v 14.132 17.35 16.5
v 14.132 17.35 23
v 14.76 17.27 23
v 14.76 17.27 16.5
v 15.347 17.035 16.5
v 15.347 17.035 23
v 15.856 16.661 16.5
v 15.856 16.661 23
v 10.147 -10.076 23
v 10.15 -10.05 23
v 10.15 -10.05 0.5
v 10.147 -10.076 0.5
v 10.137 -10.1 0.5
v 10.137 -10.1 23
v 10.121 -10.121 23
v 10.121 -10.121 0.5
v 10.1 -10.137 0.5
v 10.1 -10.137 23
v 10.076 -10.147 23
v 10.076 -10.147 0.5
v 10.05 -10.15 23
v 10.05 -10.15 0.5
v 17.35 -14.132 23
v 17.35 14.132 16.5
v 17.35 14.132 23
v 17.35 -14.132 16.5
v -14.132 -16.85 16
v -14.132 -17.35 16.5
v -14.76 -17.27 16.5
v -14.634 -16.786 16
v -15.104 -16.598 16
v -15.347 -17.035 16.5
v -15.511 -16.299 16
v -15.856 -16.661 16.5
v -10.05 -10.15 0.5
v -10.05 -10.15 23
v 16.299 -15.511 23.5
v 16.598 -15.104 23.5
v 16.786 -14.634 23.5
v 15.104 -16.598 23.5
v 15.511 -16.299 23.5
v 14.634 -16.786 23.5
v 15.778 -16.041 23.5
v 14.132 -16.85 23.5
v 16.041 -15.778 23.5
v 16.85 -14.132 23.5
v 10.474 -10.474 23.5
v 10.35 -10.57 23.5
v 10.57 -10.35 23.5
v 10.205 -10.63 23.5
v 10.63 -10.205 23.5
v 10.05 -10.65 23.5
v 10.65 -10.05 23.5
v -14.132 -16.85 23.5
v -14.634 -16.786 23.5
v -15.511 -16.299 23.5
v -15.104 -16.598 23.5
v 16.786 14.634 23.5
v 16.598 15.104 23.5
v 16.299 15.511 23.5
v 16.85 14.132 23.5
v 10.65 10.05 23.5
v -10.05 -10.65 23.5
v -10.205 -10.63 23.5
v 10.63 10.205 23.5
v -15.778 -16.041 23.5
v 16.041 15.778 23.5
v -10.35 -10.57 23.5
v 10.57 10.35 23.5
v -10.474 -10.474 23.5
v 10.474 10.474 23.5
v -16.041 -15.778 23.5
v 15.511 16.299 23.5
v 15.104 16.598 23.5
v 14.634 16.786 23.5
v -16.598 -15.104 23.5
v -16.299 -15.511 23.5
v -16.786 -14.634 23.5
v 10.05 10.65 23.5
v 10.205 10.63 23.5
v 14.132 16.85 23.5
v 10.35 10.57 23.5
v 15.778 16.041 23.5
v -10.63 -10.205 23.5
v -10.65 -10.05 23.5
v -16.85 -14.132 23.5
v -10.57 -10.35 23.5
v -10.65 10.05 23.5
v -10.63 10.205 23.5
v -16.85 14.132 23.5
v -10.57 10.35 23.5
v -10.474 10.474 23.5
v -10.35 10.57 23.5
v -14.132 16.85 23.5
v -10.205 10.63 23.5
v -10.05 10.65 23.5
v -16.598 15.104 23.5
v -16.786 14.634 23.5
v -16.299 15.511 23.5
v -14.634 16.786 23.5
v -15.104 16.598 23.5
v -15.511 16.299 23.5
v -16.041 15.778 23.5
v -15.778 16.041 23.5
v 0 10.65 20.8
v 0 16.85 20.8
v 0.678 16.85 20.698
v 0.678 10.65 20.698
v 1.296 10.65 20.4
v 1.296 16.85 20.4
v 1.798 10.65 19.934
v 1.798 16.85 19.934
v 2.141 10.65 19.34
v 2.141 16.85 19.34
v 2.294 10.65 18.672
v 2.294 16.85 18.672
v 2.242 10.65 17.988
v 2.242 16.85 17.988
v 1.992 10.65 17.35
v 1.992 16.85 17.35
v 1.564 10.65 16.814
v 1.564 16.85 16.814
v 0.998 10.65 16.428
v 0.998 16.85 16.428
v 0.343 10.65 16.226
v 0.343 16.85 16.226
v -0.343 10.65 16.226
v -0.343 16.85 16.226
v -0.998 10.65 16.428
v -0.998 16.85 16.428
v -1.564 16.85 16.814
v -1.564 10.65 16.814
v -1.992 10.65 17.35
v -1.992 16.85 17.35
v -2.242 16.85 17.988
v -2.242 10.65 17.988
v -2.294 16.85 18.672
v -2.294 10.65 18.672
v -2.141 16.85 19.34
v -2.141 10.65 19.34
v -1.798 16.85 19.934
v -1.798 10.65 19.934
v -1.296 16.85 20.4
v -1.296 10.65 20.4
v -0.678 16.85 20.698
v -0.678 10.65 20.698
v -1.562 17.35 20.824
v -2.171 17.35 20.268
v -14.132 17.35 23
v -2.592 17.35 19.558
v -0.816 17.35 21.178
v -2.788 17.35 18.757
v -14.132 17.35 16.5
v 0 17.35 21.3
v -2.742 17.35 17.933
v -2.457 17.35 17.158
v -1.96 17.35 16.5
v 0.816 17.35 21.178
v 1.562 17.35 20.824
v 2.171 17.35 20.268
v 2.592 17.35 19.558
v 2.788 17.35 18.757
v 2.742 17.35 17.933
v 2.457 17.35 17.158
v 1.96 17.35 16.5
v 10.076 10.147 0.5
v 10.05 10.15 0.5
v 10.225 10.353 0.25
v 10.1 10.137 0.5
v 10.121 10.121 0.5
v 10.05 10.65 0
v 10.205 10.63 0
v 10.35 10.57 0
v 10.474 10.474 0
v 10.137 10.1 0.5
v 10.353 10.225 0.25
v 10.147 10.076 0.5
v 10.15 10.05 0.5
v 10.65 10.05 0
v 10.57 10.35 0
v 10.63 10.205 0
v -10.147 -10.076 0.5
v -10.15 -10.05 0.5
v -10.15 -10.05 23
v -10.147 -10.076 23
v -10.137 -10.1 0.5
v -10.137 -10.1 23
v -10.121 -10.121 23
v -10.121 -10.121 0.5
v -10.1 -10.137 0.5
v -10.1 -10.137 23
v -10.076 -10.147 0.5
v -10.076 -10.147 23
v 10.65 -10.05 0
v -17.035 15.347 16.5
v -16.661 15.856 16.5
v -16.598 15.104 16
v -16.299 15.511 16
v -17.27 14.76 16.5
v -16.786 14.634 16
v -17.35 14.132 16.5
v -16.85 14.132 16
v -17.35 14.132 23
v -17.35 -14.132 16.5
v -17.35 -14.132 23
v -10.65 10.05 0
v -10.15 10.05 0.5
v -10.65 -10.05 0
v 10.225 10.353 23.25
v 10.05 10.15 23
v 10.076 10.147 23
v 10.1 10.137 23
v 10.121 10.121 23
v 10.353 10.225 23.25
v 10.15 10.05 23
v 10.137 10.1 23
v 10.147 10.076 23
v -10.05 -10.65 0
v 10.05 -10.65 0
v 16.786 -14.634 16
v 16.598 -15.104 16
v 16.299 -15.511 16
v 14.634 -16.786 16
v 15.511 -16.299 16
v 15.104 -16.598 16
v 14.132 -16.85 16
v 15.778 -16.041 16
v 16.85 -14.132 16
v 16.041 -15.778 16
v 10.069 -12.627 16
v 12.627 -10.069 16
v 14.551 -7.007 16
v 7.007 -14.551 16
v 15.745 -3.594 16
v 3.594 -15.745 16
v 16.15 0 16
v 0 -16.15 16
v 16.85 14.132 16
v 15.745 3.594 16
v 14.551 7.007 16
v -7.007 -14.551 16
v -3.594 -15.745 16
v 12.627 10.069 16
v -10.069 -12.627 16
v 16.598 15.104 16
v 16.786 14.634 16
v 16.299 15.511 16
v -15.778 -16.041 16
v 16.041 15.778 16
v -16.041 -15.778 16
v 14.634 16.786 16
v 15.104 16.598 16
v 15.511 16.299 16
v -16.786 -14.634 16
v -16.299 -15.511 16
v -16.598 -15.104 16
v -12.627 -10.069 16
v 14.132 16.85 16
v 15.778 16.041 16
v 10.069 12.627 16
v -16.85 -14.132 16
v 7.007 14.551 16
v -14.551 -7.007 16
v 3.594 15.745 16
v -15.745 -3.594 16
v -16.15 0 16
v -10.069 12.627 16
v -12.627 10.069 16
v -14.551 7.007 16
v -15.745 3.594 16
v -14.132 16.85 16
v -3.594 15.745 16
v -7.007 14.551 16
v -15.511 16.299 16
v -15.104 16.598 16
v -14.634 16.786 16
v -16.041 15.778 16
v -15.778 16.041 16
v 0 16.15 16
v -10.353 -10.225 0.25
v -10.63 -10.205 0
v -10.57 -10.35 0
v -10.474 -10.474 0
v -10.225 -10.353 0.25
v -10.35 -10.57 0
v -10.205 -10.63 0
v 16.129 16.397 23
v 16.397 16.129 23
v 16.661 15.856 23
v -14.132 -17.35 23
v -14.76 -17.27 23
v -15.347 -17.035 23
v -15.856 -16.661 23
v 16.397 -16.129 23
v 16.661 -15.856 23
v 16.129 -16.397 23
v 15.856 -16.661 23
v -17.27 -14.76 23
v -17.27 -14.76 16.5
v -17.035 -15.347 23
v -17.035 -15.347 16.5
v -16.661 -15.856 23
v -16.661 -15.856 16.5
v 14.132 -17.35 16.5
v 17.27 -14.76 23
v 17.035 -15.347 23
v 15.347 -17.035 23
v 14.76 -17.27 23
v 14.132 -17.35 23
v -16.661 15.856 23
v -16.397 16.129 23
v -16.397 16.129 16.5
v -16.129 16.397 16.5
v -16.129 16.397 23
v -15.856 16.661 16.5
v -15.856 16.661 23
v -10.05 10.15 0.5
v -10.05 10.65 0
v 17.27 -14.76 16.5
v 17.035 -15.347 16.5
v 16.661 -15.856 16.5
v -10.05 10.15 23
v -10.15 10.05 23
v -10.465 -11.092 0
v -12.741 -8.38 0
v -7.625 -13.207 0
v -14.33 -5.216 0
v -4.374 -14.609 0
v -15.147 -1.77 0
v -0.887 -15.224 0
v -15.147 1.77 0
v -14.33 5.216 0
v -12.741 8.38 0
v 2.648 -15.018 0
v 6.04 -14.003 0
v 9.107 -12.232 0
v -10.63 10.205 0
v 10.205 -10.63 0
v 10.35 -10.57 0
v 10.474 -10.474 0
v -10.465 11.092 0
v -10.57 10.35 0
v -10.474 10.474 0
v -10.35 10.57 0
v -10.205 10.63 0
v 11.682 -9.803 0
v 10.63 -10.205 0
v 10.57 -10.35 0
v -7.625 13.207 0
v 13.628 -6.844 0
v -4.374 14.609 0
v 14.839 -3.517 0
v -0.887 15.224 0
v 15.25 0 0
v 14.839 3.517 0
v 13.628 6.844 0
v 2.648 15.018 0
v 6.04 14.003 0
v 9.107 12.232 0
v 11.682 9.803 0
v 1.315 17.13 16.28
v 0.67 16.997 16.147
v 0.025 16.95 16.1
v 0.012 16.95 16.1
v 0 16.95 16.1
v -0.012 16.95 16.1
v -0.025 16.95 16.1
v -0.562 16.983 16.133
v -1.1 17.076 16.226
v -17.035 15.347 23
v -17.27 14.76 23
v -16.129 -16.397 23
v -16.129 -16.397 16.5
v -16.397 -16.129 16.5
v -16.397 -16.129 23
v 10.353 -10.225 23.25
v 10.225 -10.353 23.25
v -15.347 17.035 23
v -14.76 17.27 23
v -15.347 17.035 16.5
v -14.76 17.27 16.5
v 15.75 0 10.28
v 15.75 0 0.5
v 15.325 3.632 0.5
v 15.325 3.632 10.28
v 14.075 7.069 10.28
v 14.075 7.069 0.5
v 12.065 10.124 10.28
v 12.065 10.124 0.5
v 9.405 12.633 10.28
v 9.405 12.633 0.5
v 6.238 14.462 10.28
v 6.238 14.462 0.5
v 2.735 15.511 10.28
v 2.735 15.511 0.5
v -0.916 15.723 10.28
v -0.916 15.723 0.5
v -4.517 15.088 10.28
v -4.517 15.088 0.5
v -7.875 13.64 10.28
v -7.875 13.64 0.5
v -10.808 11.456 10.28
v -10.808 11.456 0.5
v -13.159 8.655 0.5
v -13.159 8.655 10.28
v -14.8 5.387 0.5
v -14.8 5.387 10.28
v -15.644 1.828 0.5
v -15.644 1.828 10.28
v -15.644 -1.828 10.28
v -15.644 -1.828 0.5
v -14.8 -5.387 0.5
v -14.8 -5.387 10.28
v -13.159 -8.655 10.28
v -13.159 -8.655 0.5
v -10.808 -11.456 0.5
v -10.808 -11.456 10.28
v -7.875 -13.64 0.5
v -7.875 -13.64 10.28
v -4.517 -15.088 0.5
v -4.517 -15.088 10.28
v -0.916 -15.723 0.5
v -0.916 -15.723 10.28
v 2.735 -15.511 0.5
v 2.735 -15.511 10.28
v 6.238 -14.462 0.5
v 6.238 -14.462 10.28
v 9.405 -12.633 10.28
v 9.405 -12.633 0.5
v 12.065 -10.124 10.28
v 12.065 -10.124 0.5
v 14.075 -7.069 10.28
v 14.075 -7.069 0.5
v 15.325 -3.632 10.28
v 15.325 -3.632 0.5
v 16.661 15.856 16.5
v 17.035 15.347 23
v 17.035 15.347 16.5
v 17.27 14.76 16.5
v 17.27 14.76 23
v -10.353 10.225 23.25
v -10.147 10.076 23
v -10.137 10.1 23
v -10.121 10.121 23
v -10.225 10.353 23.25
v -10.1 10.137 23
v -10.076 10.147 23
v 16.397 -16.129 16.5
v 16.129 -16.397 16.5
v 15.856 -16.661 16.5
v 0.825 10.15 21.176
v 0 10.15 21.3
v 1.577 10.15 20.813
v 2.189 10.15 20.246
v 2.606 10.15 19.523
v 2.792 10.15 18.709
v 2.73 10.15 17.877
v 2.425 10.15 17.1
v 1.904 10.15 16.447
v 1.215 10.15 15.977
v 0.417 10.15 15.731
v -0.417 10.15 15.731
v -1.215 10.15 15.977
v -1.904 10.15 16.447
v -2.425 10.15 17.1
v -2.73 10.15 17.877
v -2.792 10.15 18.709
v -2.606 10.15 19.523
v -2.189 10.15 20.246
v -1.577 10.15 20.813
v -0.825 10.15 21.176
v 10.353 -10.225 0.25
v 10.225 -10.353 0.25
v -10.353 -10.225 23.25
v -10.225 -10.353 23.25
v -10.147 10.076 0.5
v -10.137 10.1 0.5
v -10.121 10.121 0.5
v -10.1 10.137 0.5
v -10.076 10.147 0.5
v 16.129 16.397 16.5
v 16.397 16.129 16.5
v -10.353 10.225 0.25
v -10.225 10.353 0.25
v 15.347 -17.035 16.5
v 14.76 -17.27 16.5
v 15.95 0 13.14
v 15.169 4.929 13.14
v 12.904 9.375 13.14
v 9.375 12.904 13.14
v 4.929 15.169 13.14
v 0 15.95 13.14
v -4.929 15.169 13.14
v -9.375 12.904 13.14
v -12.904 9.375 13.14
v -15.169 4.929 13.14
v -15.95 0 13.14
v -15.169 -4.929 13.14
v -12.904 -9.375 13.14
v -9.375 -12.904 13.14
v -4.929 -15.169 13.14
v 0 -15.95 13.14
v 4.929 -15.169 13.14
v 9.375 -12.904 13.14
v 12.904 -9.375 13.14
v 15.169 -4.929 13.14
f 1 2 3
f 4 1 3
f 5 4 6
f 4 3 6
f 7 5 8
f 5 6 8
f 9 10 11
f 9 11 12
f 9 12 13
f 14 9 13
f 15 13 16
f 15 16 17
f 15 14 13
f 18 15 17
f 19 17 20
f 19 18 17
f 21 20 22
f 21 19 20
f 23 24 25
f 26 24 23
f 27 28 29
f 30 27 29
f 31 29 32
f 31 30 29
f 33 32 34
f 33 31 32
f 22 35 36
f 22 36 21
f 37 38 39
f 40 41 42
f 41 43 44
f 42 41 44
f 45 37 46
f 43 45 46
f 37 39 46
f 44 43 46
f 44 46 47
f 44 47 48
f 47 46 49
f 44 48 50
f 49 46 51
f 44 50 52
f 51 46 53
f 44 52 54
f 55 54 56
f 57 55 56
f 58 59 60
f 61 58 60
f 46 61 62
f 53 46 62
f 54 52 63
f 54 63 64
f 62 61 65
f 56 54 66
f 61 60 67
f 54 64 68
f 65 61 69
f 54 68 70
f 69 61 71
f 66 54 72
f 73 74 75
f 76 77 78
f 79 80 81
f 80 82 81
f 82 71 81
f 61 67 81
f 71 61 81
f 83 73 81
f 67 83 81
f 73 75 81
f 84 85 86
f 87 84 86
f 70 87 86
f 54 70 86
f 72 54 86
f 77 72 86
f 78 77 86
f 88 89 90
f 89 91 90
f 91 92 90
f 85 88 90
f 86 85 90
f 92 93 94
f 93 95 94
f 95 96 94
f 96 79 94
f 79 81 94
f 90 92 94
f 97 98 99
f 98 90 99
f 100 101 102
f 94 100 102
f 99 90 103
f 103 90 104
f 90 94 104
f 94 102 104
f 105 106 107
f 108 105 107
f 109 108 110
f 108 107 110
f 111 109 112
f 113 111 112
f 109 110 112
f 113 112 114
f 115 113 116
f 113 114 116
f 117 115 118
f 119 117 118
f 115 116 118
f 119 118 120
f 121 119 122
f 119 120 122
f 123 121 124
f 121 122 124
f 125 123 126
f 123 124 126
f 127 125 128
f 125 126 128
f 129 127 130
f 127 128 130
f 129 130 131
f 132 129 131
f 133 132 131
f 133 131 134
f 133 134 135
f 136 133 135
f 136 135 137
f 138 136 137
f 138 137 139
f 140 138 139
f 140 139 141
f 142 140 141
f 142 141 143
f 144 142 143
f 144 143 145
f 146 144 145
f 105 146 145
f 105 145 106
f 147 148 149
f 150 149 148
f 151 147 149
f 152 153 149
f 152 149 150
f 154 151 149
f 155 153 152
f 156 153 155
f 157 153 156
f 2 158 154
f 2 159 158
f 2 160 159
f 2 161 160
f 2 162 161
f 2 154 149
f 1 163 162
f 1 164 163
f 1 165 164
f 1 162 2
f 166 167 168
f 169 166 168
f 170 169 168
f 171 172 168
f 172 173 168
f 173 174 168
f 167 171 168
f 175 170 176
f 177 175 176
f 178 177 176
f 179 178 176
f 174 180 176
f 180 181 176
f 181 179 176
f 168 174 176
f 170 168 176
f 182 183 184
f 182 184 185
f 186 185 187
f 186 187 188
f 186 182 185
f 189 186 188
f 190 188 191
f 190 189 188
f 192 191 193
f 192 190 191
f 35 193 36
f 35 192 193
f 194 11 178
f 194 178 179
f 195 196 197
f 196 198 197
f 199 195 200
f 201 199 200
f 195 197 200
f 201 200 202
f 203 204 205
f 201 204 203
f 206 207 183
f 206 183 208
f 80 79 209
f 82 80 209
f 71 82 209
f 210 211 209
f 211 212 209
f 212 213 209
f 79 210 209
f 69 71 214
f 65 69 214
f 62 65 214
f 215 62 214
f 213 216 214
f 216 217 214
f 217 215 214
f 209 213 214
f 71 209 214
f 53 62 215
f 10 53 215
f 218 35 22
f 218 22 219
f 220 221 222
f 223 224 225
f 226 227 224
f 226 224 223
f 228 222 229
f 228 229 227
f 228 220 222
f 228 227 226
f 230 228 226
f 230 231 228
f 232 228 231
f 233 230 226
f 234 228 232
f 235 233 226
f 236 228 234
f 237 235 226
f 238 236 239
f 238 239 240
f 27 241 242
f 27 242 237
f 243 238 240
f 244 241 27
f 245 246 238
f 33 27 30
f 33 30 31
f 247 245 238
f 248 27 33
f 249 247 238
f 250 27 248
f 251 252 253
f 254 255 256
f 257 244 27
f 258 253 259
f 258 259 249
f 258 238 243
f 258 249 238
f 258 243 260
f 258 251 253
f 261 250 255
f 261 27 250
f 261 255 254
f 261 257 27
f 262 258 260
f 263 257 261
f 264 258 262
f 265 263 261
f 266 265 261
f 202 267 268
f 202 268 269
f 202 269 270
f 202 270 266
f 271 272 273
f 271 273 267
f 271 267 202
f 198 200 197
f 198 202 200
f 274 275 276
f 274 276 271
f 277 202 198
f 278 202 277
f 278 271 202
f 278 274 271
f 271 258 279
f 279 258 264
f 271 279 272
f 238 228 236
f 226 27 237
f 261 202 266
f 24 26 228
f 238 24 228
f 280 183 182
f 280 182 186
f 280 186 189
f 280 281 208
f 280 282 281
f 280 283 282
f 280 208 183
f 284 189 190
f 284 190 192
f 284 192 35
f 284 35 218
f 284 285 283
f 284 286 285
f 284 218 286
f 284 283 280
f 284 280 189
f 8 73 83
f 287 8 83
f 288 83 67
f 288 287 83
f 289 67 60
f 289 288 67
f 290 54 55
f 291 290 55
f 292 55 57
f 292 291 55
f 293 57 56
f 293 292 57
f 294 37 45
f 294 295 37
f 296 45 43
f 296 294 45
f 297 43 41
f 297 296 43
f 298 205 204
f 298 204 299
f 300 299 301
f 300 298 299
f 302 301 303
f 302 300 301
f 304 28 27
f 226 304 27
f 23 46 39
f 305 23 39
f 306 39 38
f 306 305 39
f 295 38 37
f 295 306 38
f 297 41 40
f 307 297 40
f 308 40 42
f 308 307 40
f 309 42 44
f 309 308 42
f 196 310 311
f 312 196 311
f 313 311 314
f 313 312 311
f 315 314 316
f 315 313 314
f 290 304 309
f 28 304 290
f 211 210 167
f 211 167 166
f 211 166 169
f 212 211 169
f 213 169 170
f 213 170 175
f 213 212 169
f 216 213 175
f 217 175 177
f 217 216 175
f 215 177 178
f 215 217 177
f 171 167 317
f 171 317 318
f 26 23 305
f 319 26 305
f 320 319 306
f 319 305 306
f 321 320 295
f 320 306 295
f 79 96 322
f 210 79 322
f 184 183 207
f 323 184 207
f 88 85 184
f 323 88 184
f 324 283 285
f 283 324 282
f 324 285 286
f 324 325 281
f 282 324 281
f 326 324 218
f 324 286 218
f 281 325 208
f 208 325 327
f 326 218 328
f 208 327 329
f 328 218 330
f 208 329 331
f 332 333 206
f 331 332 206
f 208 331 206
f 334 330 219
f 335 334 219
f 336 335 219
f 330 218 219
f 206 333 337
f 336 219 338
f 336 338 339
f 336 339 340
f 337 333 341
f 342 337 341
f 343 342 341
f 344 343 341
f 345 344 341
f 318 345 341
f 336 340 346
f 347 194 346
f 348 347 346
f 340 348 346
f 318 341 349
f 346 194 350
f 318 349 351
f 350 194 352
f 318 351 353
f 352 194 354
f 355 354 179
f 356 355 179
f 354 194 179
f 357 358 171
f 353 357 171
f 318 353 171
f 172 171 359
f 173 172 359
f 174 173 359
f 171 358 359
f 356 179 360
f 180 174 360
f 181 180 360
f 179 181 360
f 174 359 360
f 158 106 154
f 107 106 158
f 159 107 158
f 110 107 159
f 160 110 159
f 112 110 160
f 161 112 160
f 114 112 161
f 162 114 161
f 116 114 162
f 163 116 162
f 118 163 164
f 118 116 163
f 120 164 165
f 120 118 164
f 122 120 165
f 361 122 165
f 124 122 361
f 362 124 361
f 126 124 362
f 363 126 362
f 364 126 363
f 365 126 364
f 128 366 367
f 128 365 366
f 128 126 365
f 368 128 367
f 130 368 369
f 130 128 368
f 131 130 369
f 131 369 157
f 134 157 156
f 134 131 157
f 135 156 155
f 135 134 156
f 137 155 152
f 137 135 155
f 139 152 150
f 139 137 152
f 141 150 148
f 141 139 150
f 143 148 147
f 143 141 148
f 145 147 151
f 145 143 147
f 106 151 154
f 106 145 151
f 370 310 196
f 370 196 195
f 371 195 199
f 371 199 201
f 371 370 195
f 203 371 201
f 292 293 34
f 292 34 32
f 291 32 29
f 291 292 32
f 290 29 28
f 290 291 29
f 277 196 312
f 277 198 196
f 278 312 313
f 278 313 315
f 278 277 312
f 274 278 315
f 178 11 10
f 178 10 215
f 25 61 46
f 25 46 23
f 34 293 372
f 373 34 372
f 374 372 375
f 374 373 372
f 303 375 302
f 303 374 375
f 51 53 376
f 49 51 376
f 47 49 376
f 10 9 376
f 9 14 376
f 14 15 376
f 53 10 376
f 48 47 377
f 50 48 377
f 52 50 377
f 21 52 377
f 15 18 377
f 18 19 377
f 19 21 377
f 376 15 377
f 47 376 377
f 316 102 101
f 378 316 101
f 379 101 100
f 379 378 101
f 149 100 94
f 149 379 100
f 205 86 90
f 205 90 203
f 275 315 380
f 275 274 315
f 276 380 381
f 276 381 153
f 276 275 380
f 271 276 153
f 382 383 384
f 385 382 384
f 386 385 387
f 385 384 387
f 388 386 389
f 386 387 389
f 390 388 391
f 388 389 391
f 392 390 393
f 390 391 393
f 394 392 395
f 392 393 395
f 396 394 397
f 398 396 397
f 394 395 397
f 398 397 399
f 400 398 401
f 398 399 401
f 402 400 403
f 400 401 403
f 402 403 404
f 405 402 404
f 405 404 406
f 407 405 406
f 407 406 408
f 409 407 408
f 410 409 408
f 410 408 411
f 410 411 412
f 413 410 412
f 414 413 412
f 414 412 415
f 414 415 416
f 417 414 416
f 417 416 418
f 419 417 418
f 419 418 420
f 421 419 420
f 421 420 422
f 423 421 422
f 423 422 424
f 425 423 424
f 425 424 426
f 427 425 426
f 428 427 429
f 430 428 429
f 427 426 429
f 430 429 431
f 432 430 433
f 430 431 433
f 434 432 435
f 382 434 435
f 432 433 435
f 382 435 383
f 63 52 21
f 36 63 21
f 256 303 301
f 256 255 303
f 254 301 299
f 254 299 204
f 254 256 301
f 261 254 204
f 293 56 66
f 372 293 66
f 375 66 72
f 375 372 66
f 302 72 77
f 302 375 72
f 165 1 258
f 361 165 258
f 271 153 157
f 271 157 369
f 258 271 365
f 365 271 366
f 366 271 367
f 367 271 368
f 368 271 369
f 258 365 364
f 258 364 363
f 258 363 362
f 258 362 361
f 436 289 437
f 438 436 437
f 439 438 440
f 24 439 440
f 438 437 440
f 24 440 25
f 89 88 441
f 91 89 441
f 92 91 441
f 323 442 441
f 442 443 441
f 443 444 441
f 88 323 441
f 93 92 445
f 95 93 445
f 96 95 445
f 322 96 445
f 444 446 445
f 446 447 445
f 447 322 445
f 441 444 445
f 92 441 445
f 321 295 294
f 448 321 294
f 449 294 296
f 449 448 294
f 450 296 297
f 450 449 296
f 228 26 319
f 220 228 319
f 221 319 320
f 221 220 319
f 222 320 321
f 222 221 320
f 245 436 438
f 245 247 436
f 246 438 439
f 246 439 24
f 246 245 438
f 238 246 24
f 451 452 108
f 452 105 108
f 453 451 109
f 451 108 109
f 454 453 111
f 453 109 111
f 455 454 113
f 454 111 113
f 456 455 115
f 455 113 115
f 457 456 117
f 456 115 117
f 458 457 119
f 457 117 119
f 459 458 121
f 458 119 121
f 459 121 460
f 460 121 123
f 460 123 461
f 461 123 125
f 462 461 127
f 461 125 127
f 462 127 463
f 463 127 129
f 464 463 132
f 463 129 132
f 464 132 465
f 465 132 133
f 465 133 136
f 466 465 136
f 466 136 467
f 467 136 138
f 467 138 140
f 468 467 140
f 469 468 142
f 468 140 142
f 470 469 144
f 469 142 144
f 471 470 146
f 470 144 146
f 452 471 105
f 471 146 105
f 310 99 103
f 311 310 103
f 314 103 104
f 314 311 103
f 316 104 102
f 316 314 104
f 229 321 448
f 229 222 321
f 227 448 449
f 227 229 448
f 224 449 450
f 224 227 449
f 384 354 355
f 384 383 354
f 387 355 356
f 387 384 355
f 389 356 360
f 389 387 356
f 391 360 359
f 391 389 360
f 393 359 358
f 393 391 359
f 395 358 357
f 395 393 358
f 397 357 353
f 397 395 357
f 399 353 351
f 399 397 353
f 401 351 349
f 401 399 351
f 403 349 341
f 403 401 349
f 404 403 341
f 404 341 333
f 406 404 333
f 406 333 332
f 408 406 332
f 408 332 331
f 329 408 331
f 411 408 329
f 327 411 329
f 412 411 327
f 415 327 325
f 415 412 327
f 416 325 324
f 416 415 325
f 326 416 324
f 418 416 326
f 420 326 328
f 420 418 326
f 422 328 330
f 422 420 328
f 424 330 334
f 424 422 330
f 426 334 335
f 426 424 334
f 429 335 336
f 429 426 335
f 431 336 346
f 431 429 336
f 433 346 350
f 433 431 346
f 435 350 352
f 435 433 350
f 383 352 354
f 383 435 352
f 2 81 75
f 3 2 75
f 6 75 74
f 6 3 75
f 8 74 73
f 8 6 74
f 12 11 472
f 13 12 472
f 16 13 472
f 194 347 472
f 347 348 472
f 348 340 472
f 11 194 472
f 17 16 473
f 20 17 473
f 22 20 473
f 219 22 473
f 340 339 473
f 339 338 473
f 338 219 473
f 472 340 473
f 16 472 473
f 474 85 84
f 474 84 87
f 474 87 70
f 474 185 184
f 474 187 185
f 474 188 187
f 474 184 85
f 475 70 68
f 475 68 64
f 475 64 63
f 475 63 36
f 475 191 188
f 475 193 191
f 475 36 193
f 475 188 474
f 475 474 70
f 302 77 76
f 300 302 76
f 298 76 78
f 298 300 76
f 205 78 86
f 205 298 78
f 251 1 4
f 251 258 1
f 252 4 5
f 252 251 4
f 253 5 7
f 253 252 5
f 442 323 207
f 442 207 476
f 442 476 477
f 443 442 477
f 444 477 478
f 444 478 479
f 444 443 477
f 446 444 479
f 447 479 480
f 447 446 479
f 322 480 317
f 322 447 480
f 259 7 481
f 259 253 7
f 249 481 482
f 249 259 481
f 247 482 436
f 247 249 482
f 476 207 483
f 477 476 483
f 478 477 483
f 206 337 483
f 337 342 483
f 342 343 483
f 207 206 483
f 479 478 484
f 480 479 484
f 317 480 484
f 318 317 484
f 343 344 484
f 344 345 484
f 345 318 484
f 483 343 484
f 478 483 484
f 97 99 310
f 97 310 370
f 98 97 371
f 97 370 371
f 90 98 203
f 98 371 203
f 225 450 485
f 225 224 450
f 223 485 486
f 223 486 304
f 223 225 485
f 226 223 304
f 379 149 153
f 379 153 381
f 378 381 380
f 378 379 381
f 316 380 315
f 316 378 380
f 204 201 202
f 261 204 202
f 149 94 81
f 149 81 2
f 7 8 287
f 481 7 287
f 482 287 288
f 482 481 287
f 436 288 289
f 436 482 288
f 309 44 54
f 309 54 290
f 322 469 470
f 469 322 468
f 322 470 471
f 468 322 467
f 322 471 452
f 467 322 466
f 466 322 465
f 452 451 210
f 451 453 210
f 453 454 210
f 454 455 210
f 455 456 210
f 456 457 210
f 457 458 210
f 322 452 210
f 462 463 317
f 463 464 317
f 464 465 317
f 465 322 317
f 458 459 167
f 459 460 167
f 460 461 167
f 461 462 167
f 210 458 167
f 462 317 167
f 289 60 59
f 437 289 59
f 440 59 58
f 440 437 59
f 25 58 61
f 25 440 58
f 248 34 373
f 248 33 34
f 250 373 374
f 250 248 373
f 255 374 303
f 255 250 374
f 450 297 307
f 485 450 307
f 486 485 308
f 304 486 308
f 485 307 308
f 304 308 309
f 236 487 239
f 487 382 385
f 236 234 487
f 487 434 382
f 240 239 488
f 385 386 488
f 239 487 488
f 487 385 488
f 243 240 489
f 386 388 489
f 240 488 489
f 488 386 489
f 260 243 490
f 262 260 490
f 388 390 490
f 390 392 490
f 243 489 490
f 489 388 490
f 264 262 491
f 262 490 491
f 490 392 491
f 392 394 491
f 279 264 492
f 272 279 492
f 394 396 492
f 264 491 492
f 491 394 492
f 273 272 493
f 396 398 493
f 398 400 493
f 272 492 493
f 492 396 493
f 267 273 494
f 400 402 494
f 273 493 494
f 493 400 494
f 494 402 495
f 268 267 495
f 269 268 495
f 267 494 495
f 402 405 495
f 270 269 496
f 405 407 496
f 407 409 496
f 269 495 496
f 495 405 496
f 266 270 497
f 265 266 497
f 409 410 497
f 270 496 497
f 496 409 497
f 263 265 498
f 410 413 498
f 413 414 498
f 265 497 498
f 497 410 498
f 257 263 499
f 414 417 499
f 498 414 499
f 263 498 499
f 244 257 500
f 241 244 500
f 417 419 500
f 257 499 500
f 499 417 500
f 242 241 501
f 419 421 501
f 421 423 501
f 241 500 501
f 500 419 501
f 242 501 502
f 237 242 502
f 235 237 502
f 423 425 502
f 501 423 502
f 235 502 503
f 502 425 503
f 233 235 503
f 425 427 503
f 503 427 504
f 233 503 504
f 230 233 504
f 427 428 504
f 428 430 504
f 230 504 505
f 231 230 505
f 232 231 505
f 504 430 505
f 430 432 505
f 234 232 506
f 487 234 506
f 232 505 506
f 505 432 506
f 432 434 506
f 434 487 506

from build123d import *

# Parameters (mm, degrees)
SKIZZE1_R                       = 15.75
SKIZZE1_W                       = 20.3
SKIZZE1_H                       = 20.3
AUFSATZ_LINEAR_AUSTRAGEN1_DEPTH = 16
SKIZZE2_W                       = 20.3
SKIZZE2_H                       = 20.3
AUFSATZ_LINEAR_AUSTRAGEN2_DEPTH = 7.5
SCHNITT_LINEAR_AUSTRAGEN1_REACH = 47.358
SKIZZE3_R                       = 2.3
CHAMFER1_SIZE                   = 0.4
CHAMFER1_SIZE2                  = 5.720266503
VERRUNDUNG1_R                   = 0.1
VERRUNDUNG2_R                   = 2.5
FASE1_SIZE                      = 0.5
FASE4_SIZE                      = 0.5


with BuildPart() as part:
    # Skizze1 → Aufsatz-Linear austragen1 (new body)
    with BuildSketch(Plane.XY):
        Circle(SKIZZE1_R)
        Rectangle(SKIZZE1_W, SKIZZE1_H, mode=Mode.SUBTRACT)
    extrude(amount=AUFSATZ_LINEAR_AUSTRAGEN1_DEPTH)

    # Skizze2 → Aufsatz-Linear austragen2 (add)
    with BuildSketch(Plane.XY.offset(16)):
        with BuildLine():
            Line((-15.098923803, 17.35), (15.098923803, 17.35))
            ThreePointArc((15.098923803, 17.35), (16.263455967, 16.263455967), (17.35, 15.098923803))
            Line((17.35, 15.098923803), (17.35, -15.098923803))
            ThreePointArc((17.35, -15.098923803), (16.263455967, -16.263455967), (15.098923803, -17.35))
            Line((15.098923803, -17.35), (-15.098923803, -17.35))
            ThreePointArc((-15.098923803, -17.35), (-16.263455967, -16.263455967), (-17.35, -15.098923803))
            Line((-17.35, -15.098923803), (-17.35, 15.098923803))
            ThreePointArc((-17.35, 15.098923803), (-16.263455967, 16.263455967), (-15.098923803, 17.35))
        make_face()
        Rectangle(SKIZZE2_W, SKIZZE2_H, mode=Mode.SUBTRACT)
    extrude(amount=AUFSATZ_LINEAR_AUSTRAGEN2_DEPTH)

    # Skizze3 → Schnitt-Linear austragen1 (cut, up to next)
    with BuildSketch(Plane(origin=(0, 17.35, 0), x_dir=(1, 0, 0), z_dir=(0, 1, 0)), mode=Mode.PRIVATE) as schnitt_linear_austragen1_sk1:
        with Locations(Location((0, -18.5, 0), (0, 0, 270))):
            Circle(SKIZZE3_R)
    schnitt_linear_austragen1_tool1 = extrude(schnitt_linear_austragen1_sk1.sketch, amount=-SCHNITT_LINEAR_AUSTRAGEN1_REACH, mode=Mode.PRIVATE) & part.part
    add(schnitt_linear_austragen1_tool1.solids().sort_by_distance((0, 17.35, 18.5))[0], mode=Mode.SUBTRACT)

    # Chamfer1
    chamfer1_edges = [part.edges().sort_by_distance(p)[0] for p in [
        (-15.75, 0, 16),
    ]]
    chamfer1_side = [part.faces().sort_by_distance(p)[0] for p in [
        (-15.916455967, 15.916455967, 16),
    ]]
    chamfer(chamfer1_edges, length=CHAMFER1_SIZE, length2=CHAMFER1_SIZE2, reference=chamfer1_side[0])

    # Verrundung1
    verrundung1_edges = [part.edges().sort_by_distance(p)[0] for p in [
        (10.15, -10.15, 11.75),
        (10.15, 10.15, 11.75),
        (-10.15, 10.15, 11.75),
        (-10.15, -10.15, 11.75),
    ]]
    fillet(verrundung1_edges, radius=VERRUNDUNG1_R)

    # Verrundung2
    verrundung2_edges = [part.edges().sort_by_distance(p)[0] for p in [
        (-15.098923803, 17.35, 19.75),
        (-17.35, 15.098923803, 19.75),
        (-17.35, -15.098923803, 19.75),
        (-15.098923803, -17.35, 19.75),
        (15.098923803, -17.35, 19.75),
        (17.35, -15.098923803, 19.75),
        (17.35, 15.098923803, 19.75),
        (15.098923803, 17.35, 19.75),
    ]]
    fillet(verrundung2_edges, radius=VERRUNDUNG2_R)

    # Fase1
    # the kernel refuses this chamfer: 0.5 mm, written as the material it takes off along each edge
    with BuildSketch(Plane(origin=(-17.35, -14.13249801, 23.5), x_dir=(0.9996219169112968, 0, 0.027495876610589005), z_dir=(0, 1, 0)), Plane(origin=(14.13249801, -17.35, 23.5), x_dir=(0, 0.9996219169112968, 0.027495876610589005), z_dir=(-1, 0, 0)), Plane(origin=(17.35, 14.13249801, 23.5), x_dir=(-0.9996219169112968, 0, 0.027495876610589005), z_dir=(0, -1, 0)), Plane(origin=(-14.13249801, 17.35, 23.5), x_dir=(0, -0.9996219169112968, 0.027495876610589005), z_dir=(1, 0, 0))) as fase1_piece_1:
        Polygon((FASE1_SIZE * 0.999621916911, FASE1_SIZE * 0.0274958766106), (-FASE1_SIZE * 0.0274958766106, FASE1_SIZE * 0.999621916911), (0, 0), align=None)
    extrude(amount=28.26499602, mode=Mode.SUBTRACT)
    with BuildSketch(Plane(origin=(0, 0, 23.5), x_dir=(-0.7243902439024396, 0.6893901468246876, 0), z_dir=(-0.6893901468246876, -0.7243902439024396, 0))) as fase1_piece_2:
        Polygon((23 - FASE1_SIZE, 0), (23, FASE1_SIZE), (23, 0), align=None)
    revolve(axis=Axis((0, 0, 23.5), (0, 0, -1)), revolution_arc=2.836293852, mode=Mode.SUBTRACT)
    with BuildSketch(Plane(origin=(0, 0, 23.5), x_dir=(0.7243902439024391, -0.6893901468246878, 0), z_dir=(0.6893901468246878, 0.7243902439024391, 0))) as fase1_piece_3:
        Polygon((23 - FASE1_SIZE, 0), (23, FASE1_SIZE), (23, 0), align=None)
    revolve(axis=Axis((0, 0, 23.5), (0, 0, -1)), revolution_arc=2.836293852, mode=Mode.SUBTRACT)
    with BuildSketch(Plane(origin=(0, 0, 23.5), x_dir=(0.689390146824687, 0.7243902439024399, 0), z_dir=(-0.7243902439024399, 0.689390146824687, 0))) as fase1_piece_4:
        Polygon((23 - FASE1_SIZE, 0), (23, FASE1_SIZE), (23, 0), align=None)
    revolve(axis=Axis((0, 0, 23.5), (0, 0, -1)), revolution_arc=2.836293852, mode=Mode.SUBTRACT)
    with BuildSketch(Plane(origin=(-14.13249801, 14.85, 23.5), x_dir=(-0.689390146824687, 0.72439024390244, 0), z_dir=(-0.72439024390244, -0.689390146824687, 0))) as fase1_piece_5:
        Polygon((2.5 - FASE1_SIZE, 0), (2.5, FASE1_SIZE), (2.5, 0), align=None)
    revolve(axis=Axis((-14.13249801, 14.85, 23.5), (0, 0, -1)), revolution_arc=43.581853074, mode=Mode.SUBTRACT)
    with BuildSketch(Plane(origin=(-14.85, 14.13249801, 23.5), x_dir=(-0.7243902439024396, 0.6893901468246874, 0), z_dir=(0.6893901468246874, 0.7243902439024396, 0))) as fase1_piece_6:
        Polygon((2.5 - FASE1_SIZE, 0), (2.5, -FASE1_SIZE), (2.5, 0), align=None)
    revolve(axis=Axis((-14.85, 14.13249801, 23.5), (0, 0, 1)), revolution_arc=43.581853074, mode=Mode.SUBTRACT)
    with BuildSketch(Plane(origin=(14.13249801, 14.85, 23.5), x_dir=(0, 1, 0), z_dir=(-1, 0, 0))) as fase1_piece_7:
        Polygon((2.5 - FASE1_SIZE, 0), (2.5, FASE1_SIZE), (2.5, 0), align=None)
    revolve(axis=Axis((14.13249801, 14.85, 23.5), (0, 0, -1)), revolution_arc=43.581853074, mode=Mode.SUBTRACT)
    with BuildSketch(Plane(origin=(14.85, 14.13249801, 23.5), x_dir=(0.72439024390244, 0.689390146824687, 0), z_dir=(-0.689390146824687, 0.72439024390244, 0))) as fase1_piece_8:
        Polygon((2.5 - FASE1_SIZE, 0), (2.5, FASE1_SIZE), (2.5, 0), align=None)
    revolve(axis=Axis((14.85, 14.13249801, 23.5), (0, 0, -1)), revolution_arc=43.581853074, mode=Mode.SUBTRACT)
    with BuildSketch(Plane(origin=(14.85, -14.13249801, 23.5), x_dir=(1, 0, 0), z_dir=(0, 1, 0))) as fase1_piece_9:
        Polygon((2.5 - FASE1_SIZE, 0), (2.5, FASE1_SIZE), (2.5, 0), align=None)
    revolve(axis=Axis((14.85, -14.13249801, 23.5), (0, 0, -1)), revolution_arc=43.581853074, mode=Mode.SUBTRACT)
    with BuildSketch(Plane(origin=(14.13249801, -14.85, 23.5), x_dir=(0.6893901468246885, -0.7243902439024386, 0), z_dir=(0.7243902439024386, 0.6893901468246885, 0))) as fase1_piece_10:
        Polygon((2.5 - FASE1_SIZE, 0), (2.5, FASE1_SIZE), (2.5, 0), align=None)
    revolve(axis=Axis((14.13249801, -14.85, 23.5), (0, 0, -1)), revolution_arc=43.581853074, mode=Mode.SUBTRACT)
    with BuildSketch(Plane(origin=(-14.13249801, -14.85, 23.5), x_dir=(0, -1, 0), z_dir=(1, 0, 0))) as fase1_piece_11:
        Polygon((2.5 - FASE1_SIZE, 0), (2.5, FASE1_SIZE), (2.5, 0), align=None)
    revolve(axis=Axis((-14.13249801, -14.85, 23.5), (0, 0, -1)), revolution_arc=43.581853074, mode=Mode.SUBTRACT)
    with BuildSketch(Plane(origin=(-14.85, -14.13249801, 23.5), x_dir=(-0.7243902439024386, -0.6893901468246885, 0), z_dir=(0.6893901468246885, -0.7243902439024386, 0))) as fase1_piece_12:
        Polygon((2.5 - FASE1_SIZE, 0), (2.5, FASE1_SIZE), (2.5, 0), align=None)
    revolve(axis=Axis((-14.85, -14.13249801, 23.5), (0, 0, -1)), revolution_arc=43.581853074, mode=Mode.SUBTRACT)
    with BuildSketch(Plane(origin=(0, 0, 0), x_dir=(1, 0, 0), z_dir=(0, -1, 0))) as fase1_piece_13:
        Polygon((15.75 - FASE1_SIZE, 0), (15.75, FASE1_SIZE), (15.75, 0), align=None)
    revolve(axis=Axis((0, 0, 0), (0, 0, 1)), mode=Mode.SUBTRACT)
    with BuildSketch(Plane(origin=(0, 10.15, 18.5), x_dir=(0, 0, 1), z_dir=(-1, 0, 0))) as fase1_piece_14:
        Polygon((2.3 + FASE1_SIZE, 0), (2.3, FASE1_SIZE), (2.3, 0), align=None)
    revolve(axis=Axis((0, 10.15, 18.5), (0, 1, 0)), mode=Mode.SUBTRACT)
    with BuildSketch(Plane(origin=(0, 17.35, 18.5), x_dir=(0, 0, 1), z_dir=(-1, 0, 0))) as fase1_piece_15:
        Polygon((2.3 + FASE1_SIZE, 0), (2.3, -FASE1_SIZE), (2.3, 0), align=None)
    revolve(axis=Axis((0, 17.35, 18.5), (0, 1, 0)), mode=Mode.SUBTRACT)
    with BuildSketch(Plane(origin=(-10.05, -10.15, 0), x_dir=(0, 0.02749587661058563, 0.9996219169112968), z_dir=(1, 0, 0)), Plane(origin=(-10.05, -10.15, 23.5), x_dir=(0, -0.9996219169112968, 0.0274958766105891), z_dir=(1, 0, 0)), Plane(origin=(10.15, -10.05, 0), x_dir=(-0.02749587661058563, 0, 0.9996219169112968), z_dir=(0, 1, 0)), Plane(origin=(10.15, -10.05, 23.5), x_dir=(0.9996219169112968, 0, 0.0274958766105891), z_dir=(0, 1, 0)), Plane(origin=(-10.15, 10.05, 0), x_dir=(0.02749587661058563, 0, 0.9996219169112968), z_dir=(0, -1, 0)), Plane(origin=(-10.15, 10.05, 23.5), x_dir=(-0.9996219169112968, 0, 0.0274958766105891), z_dir=(0, -1, 0)), Plane(origin=(10.05, 10.15, 0), x_dir=(0, -0.02749587661058563, 0.9996219169112968), z_dir=(-1, 0, 0)), Plane(origin=(10.05, 10.15, 23.5), x_dir=(0, 0.9996219169112968, 0.0274958766105891), z_dir=(-1, 0, 0))) as fase1_piece_16:
        Polygon((FASE1_SIZE * 0.999621916911, FASE1_SIZE * 0.0274958766106), (-FASE1_SIZE * 0.0274958766106, FASE1_SIZE * 0.999621916911), (0, 0), align=None)
    extrude(amount=20.1, mode=Mode.SUBTRACT)
    with BuildSketch(Plane(origin=(10.05, -10.05, 0), x_dir=(1, 0, 0), z_dir=(0, 1, 0))) as fase1_piece_17:
        Polygon((0.1, -FASE1_SIZE), (0.1 + FASE1_SIZE, 0), (0.1, 0), align=None)
    revolve(axis=Axis((10.05, -10.05, 0), (0, 0, -1)), revolution_arc=90, mode=Mode.SUBTRACT)
    with BuildSketch(Plane(origin=(10.05, -10.05, 23.5), x_dir=(1, 0, 0), z_dir=(0, 1, 0))) as fase1_piece_18:
        Polygon((0.1 + FASE1_SIZE, 0), (0.1, FASE1_SIZE), (0.1, 0), align=None)
    revolve(axis=Axis((10.05, -10.05, 23.5), (0, 0, -1)), revolution_arc=90, mode=Mode.SUBTRACT)
    with BuildSketch(Plane(origin=(-10.05, -10.05, 0), x_dir=(-1, 0, 0), z_dir=(0, 1, 0))) as fase1_piece_19:
        Polygon((0.1, FASE1_SIZE), (0.1 + FASE1_SIZE, 0), (0.1, 0), align=None)
    revolve(axis=Axis((-10.05, -10.05, 0), (0, 0, 1)), revolution_arc=90, mode=Mode.SUBTRACT)
    with BuildSketch(Plane(origin=(-10.05, -10.05, 23.5), x_dir=(-1, 0, 0), z_dir=(0, 1, 0))) as fase1_piece_20:
        Polygon((0.1 + FASE1_SIZE, 0), (0.1, -FASE1_SIZE), (0.1, 0), align=None)
    revolve(axis=Axis((-10.05, -10.05, 23.5), (0, 0, 1)), revolution_arc=90, mode=Mode.SUBTRACT)
    with BuildSketch(Plane(origin=(-10.05, 10.05, 0), x_dir=(-1, 0, 0), z_dir=(0, -1, 0))) as fase1_piece_21:
        Polygon((0.1, -FASE1_SIZE), (0.1 + FASE1_SIZE, 0), (0.1, 0), align=None)
    revolve(axis=Axis((-10.05, 10.05, 0), (0, 0, -1)), revolution_arc=90, mode=Mode.SUBTRACT)
    with BuildSketch(Plane(origin=(-10.05, 10.05, 23.5), x_dir=(-1, 0, 0), z_dir=(0, -1, 0))) as fase1_piece_22:
        Polygon((0.1 + FASE1_SIZE, 0), (0.1, FASE1_SIZE), (0.1, 0), align=None)
    revolve(axis=Axis((-10.05, 10.05, 23.5), (0, 0, -1)), revolution_arc=90, mode=Mode.SUBTRACT)
    with BuildSketch(Plane(origin=(10.05, 10.05, 0), x_dir=(0, 1, 0), z_dir=(-1, 0, 0))) as fase1_piece_23:
        Polygon((0.1, -FASE1_SIZE), (0.1 + FASE1_SIZE, 0), (0.1, 0), align=None)
    revolve(axis=Axis((10.05, 10.05, 0), (0, 0, -1)), revolution_arc=90, mode=Mode.SUBTRACT)
    with BuildSketch(Plane(origin=(10.05, 10.05, 23.5), x_dir=(0, 1, 0), z_dir=(-1, 0, 0))) as fase1_piece_24:
        Polygon((0.1 + FASE1_SIZE, 0), (0.1, FASE1_SIZE), (0.1, 0), align=None)
    revolve(axis=Axis((10.05, 10.05, 23.5), (0, 0, -1)), revolution_arc=90, mode=Mode.SUBTRACT)
    with BuildSketch(Plane(origin=(0, 0, 23.5), x_dir=(-0.6893901468246829, -0.7243902439024439, 0), z_dir=(0.7243902439024439, -0.6893901468246829, 0))) as fase1_piece_25:
        Polygon((23 - FASE1_SIZE, 0), (23, FASE1_SIZE), (23, 0), align=None)
    revolve(axis=Axis((0, 0, 23.5), (0, 0, -1)), revolution_arc=2.836293852, mode=Mode.SUBTRACT)

    # Fase4
    # the kernel refuses this chamfer: 0.5 mm, written as the material it takes off along each edge
    with BuildSketch(Plane(origin=(14.13249801, -17.35, 16), x_dir=(0, -0.027495876610589005, 0.9996219169112968), z_dir=(-1, 0, 0)), Plane(origin=(17.35, 14.13249801, 16), x_dir=(0.027495876610589005, 0, 0.9996219169112968), z_dir=(0, -1, 0)), Plane(origin=(-17.35, -14.13249801, 16), x_dir=(-0.027495876610589005, 0, 0.9996219169112968), z_dir=(0, 1, 0))) as fase4_piece_1:
        Polygon((FASE4_SIZE * 0.999621916911, FASE4_SIZE * 0.0274958766106), (-FASE4_SIZE * 0.0274958766106, FASE4_SIZE * 0.999621916911), (0, 0), align=None)
    extrude(amount=28.26499602, mode=Mode.SUBTRACT)
    with BuildSketch(Plane(origin=(14.13249801, -14.85, 16), x_dir=(0.6893901468246885, -0.7243902439024386, 0), z_dir=(0.7243902439024386, 0.6893901468246885, 0))) as fase4_piece_2:
        Polygon((2.5, -FASE4_SIZE), (2.5 - FASE4_SIZE, 0), (2.5, 0), align=None)
    revolve(axis=Axis((14.13249801, -14.85, 16), (0, 0, -1)), revolution_arc=43.581853074, mode=Mode.SUBTRACT)
    with BuildSketch(Plane(origin=(-14.13249801, -14.85, 16), x_dir=(0, -1, 0), z_dir=(1, 0, 0))) as fase4_piece_3:
        Polygon((2.5, -FASE4_SIZE), (2.5 - FASE4_SIZE, 0), (2.5, 0), align=None)
    revolve(axis=Axis((-14.13249801, -14.85, 16), (0, 0, -1)), revolution_arc=43.581853074, mode=Mode.SUBTRACT)
    with BuildSketch(Plane(origin=(0, 0, 16), x_dir=(0.7243902439024391, -0.6893901468246878, 0), z_dir=(0.6893901468246878, 0.7243902439024391, 0))) as fase4_piece_4:
        Polygon((23, -FASE4_SIZE), (23 - FASE4_SIZE, 0), (23, 0), align=None)
    revolve(axis=Axis((0, 0, 16), (0, 0, -1)), revolution_arc=2.836293852, mode=Mode.SUBTRACT)
    with BuildSketch(Plane(origin=(0, 0, 16), x_dir=(-0.6893901468246829, -0.7243902439024439, 0), z_dir=(0.7243902439024439, -0.6893901468246829, 0))) as fase4_piece_5:
        Polygon((23, -FASE4_SIZE), (23 - FASE4_SIZE, 0), (23, 0), align=None)
    revolve(axis=Axis((0, 0, 16), (0, 0, -1)), revolution_arc=2.836293852, mode=Mode.SUBTRACT)
    with BuildSketch(Plane(origin=(14.85, -14.13249801, 16), x_dir=(1, 0, 0), z_dir=(0, 1, 0))) as fase4_piece_6:
        Polygon((2.5, -FASE4_SIZE), (2.5 - FASE4_SIZE, 0), (2.5, 0), align=None)
    revolve(axis=Axis((14.85, -14.13249801, 16), (0, 0, -1)), revolution_arc=43.581853074, mode=Mode.SUBTRACT)
    with BuildSketch(Plane(origin=(-14.85, -14.13249801, 16), x_dir=(-0.7243902439024386, -0.6893901468246885, 0), z_dir=(0.6893901468246885, -0.7243902439024386, 0))) as fase4_piece_7:
        Polygon((2.5, -FASE4_SIZE), (2.5 - FASE4_SIZE, 0), (2.5, 0), align=None)
    revolve(axis=Axis((-14.85, -14.13249801, 16), (0, 0, -1)), revolution_arc=43.581853074, mode=Mode.SUBTRACT)
    with BuildSketch(Plane(origin=(14.85, 14.13249801, 16), x_dir=(0.72439024390244, 0.689390146824687, 0), z_dir=(-0.689390146824687, 0.72439024390244, 0))) as fase4_piece_8:
        Polygon((2.5, -FASE4_SIZE), (2.5 - FASE4_SIZE, 0), (2.5, 0), align=None)
    revolve(axis=Axis((14.85, 14.13249801, 16), (0, 0, -1)), revolution_arc=43.581853074, mode=Mode.SUBTRACT)
    with BuildSketch(Plane(origin=(-14.85, 14.13249801, 16), x_dir=(-0.7243902439024396, 0.6893901468246874, 0), z_dir=(0.6893901468246874, 0.7243902439024396, 0))) as fase4_piece_9:
        Polygon((2.5, FASE4_SIZE), (2.5 - FASE4_SIZE, 0), (2.5, 0), align=None)
    revolve(axis=Axis((-14.85, 14.13249801, 16), (0, 0, 1)), revolution_arc=43.581853074, mode=Mode.SUBTRACT)
    with BuildSketch(Plane(origin=(0, 0, 16), x_dir=(0.689390146824687, 0.7243902439024399, 0), z_dir=(-0.7243902439024399, 0.689390146824687, 0))) as fase4_piece_10:
        Polygon((23, -FASE4_SIZE), (23 - FASE4_SIZE, 0), (23, 0), align=None)
    revolve(axis=Axis((0, 0, 16), (0, 0, -1)), revolution_arc=2.836293852, mode=Mode.SUBTRACT)
    with BuildSketch(Plane(origin=(0, 0, 16), x_dir=(-0.7243902439024396, 0.6893901468246876, 0), z_dir=(-0.6893901468246876, -0.7243902439024396, 0))) as fase4_piece_11:
        Polygon((23, -FASE4_SIZE), (23 - FASE4_SIZE, 0), (23, 0), align=None)
    revolve(axis=Axis((0, 0, 16), (0, 0, -1)), revolution_arc=2.836293852, mode=Mode.SUBTRACT)
    with BuildSketch(Plane(origin=(14.13249801, 14.85, 16), x_dir=(0, 1, 0), z_dir=(-1, 0, 0))) as fase4_piece_12:
        Polygon((2.5, -FASE4_SIZE), (2.5 - FASE4_SIZE, 0), (2.5, 0), align=None)
    revolve(axis=Axis((14.13249801, 14.85, 16), (0, 0, -1)), revolution_arc=43.581853074, mode=Mode.SUBTRACT)
    with BuildSketch(Plane(origin=(-14.13249801, 14.85, 16), x_dir=(-0.689390146824687, 0.72439024390244, 0), z_dir=(-0.72439024390244, -0.689390146824687, 0))) as fase4_piece_13:
        Polygon((2.5, -FASE4_SIZE), (2.5 - FASE4_SIZE, 0), (2.5, 0), align=None)
    revolve(axis=Axis((-14.13249801, 14.85, 16), (0, 0, -1)), revolution_arc=43.581853074, mode=Mode.SUBTRACT)
    with BuildSketch(Plane(origin=(-0.024889473, 17.35, 16), x_dir=(0, 0.027495876610589005, 0.9996219169112968), z_dir=(1, 0, 0)), Plane(origin=(-14.13249801, 17.35, 16), x_dir=(0, 0.027495876610589005, 0.9996219169112968), z_dir=(1, 0, 0))) as fase4_piece_14:
        Polygon((FASE4_SIZE * 0.999621916911, FASE4_SIZE * 0.0274958766106), (-FASE4_SIZE * 0.0274958766106, FASE4_SIZE * 0.999621916911), (0, 0), align=None)
    extrude(amount=14.157387483, mode=Mode.SUBTRACT)


solid = part.part
